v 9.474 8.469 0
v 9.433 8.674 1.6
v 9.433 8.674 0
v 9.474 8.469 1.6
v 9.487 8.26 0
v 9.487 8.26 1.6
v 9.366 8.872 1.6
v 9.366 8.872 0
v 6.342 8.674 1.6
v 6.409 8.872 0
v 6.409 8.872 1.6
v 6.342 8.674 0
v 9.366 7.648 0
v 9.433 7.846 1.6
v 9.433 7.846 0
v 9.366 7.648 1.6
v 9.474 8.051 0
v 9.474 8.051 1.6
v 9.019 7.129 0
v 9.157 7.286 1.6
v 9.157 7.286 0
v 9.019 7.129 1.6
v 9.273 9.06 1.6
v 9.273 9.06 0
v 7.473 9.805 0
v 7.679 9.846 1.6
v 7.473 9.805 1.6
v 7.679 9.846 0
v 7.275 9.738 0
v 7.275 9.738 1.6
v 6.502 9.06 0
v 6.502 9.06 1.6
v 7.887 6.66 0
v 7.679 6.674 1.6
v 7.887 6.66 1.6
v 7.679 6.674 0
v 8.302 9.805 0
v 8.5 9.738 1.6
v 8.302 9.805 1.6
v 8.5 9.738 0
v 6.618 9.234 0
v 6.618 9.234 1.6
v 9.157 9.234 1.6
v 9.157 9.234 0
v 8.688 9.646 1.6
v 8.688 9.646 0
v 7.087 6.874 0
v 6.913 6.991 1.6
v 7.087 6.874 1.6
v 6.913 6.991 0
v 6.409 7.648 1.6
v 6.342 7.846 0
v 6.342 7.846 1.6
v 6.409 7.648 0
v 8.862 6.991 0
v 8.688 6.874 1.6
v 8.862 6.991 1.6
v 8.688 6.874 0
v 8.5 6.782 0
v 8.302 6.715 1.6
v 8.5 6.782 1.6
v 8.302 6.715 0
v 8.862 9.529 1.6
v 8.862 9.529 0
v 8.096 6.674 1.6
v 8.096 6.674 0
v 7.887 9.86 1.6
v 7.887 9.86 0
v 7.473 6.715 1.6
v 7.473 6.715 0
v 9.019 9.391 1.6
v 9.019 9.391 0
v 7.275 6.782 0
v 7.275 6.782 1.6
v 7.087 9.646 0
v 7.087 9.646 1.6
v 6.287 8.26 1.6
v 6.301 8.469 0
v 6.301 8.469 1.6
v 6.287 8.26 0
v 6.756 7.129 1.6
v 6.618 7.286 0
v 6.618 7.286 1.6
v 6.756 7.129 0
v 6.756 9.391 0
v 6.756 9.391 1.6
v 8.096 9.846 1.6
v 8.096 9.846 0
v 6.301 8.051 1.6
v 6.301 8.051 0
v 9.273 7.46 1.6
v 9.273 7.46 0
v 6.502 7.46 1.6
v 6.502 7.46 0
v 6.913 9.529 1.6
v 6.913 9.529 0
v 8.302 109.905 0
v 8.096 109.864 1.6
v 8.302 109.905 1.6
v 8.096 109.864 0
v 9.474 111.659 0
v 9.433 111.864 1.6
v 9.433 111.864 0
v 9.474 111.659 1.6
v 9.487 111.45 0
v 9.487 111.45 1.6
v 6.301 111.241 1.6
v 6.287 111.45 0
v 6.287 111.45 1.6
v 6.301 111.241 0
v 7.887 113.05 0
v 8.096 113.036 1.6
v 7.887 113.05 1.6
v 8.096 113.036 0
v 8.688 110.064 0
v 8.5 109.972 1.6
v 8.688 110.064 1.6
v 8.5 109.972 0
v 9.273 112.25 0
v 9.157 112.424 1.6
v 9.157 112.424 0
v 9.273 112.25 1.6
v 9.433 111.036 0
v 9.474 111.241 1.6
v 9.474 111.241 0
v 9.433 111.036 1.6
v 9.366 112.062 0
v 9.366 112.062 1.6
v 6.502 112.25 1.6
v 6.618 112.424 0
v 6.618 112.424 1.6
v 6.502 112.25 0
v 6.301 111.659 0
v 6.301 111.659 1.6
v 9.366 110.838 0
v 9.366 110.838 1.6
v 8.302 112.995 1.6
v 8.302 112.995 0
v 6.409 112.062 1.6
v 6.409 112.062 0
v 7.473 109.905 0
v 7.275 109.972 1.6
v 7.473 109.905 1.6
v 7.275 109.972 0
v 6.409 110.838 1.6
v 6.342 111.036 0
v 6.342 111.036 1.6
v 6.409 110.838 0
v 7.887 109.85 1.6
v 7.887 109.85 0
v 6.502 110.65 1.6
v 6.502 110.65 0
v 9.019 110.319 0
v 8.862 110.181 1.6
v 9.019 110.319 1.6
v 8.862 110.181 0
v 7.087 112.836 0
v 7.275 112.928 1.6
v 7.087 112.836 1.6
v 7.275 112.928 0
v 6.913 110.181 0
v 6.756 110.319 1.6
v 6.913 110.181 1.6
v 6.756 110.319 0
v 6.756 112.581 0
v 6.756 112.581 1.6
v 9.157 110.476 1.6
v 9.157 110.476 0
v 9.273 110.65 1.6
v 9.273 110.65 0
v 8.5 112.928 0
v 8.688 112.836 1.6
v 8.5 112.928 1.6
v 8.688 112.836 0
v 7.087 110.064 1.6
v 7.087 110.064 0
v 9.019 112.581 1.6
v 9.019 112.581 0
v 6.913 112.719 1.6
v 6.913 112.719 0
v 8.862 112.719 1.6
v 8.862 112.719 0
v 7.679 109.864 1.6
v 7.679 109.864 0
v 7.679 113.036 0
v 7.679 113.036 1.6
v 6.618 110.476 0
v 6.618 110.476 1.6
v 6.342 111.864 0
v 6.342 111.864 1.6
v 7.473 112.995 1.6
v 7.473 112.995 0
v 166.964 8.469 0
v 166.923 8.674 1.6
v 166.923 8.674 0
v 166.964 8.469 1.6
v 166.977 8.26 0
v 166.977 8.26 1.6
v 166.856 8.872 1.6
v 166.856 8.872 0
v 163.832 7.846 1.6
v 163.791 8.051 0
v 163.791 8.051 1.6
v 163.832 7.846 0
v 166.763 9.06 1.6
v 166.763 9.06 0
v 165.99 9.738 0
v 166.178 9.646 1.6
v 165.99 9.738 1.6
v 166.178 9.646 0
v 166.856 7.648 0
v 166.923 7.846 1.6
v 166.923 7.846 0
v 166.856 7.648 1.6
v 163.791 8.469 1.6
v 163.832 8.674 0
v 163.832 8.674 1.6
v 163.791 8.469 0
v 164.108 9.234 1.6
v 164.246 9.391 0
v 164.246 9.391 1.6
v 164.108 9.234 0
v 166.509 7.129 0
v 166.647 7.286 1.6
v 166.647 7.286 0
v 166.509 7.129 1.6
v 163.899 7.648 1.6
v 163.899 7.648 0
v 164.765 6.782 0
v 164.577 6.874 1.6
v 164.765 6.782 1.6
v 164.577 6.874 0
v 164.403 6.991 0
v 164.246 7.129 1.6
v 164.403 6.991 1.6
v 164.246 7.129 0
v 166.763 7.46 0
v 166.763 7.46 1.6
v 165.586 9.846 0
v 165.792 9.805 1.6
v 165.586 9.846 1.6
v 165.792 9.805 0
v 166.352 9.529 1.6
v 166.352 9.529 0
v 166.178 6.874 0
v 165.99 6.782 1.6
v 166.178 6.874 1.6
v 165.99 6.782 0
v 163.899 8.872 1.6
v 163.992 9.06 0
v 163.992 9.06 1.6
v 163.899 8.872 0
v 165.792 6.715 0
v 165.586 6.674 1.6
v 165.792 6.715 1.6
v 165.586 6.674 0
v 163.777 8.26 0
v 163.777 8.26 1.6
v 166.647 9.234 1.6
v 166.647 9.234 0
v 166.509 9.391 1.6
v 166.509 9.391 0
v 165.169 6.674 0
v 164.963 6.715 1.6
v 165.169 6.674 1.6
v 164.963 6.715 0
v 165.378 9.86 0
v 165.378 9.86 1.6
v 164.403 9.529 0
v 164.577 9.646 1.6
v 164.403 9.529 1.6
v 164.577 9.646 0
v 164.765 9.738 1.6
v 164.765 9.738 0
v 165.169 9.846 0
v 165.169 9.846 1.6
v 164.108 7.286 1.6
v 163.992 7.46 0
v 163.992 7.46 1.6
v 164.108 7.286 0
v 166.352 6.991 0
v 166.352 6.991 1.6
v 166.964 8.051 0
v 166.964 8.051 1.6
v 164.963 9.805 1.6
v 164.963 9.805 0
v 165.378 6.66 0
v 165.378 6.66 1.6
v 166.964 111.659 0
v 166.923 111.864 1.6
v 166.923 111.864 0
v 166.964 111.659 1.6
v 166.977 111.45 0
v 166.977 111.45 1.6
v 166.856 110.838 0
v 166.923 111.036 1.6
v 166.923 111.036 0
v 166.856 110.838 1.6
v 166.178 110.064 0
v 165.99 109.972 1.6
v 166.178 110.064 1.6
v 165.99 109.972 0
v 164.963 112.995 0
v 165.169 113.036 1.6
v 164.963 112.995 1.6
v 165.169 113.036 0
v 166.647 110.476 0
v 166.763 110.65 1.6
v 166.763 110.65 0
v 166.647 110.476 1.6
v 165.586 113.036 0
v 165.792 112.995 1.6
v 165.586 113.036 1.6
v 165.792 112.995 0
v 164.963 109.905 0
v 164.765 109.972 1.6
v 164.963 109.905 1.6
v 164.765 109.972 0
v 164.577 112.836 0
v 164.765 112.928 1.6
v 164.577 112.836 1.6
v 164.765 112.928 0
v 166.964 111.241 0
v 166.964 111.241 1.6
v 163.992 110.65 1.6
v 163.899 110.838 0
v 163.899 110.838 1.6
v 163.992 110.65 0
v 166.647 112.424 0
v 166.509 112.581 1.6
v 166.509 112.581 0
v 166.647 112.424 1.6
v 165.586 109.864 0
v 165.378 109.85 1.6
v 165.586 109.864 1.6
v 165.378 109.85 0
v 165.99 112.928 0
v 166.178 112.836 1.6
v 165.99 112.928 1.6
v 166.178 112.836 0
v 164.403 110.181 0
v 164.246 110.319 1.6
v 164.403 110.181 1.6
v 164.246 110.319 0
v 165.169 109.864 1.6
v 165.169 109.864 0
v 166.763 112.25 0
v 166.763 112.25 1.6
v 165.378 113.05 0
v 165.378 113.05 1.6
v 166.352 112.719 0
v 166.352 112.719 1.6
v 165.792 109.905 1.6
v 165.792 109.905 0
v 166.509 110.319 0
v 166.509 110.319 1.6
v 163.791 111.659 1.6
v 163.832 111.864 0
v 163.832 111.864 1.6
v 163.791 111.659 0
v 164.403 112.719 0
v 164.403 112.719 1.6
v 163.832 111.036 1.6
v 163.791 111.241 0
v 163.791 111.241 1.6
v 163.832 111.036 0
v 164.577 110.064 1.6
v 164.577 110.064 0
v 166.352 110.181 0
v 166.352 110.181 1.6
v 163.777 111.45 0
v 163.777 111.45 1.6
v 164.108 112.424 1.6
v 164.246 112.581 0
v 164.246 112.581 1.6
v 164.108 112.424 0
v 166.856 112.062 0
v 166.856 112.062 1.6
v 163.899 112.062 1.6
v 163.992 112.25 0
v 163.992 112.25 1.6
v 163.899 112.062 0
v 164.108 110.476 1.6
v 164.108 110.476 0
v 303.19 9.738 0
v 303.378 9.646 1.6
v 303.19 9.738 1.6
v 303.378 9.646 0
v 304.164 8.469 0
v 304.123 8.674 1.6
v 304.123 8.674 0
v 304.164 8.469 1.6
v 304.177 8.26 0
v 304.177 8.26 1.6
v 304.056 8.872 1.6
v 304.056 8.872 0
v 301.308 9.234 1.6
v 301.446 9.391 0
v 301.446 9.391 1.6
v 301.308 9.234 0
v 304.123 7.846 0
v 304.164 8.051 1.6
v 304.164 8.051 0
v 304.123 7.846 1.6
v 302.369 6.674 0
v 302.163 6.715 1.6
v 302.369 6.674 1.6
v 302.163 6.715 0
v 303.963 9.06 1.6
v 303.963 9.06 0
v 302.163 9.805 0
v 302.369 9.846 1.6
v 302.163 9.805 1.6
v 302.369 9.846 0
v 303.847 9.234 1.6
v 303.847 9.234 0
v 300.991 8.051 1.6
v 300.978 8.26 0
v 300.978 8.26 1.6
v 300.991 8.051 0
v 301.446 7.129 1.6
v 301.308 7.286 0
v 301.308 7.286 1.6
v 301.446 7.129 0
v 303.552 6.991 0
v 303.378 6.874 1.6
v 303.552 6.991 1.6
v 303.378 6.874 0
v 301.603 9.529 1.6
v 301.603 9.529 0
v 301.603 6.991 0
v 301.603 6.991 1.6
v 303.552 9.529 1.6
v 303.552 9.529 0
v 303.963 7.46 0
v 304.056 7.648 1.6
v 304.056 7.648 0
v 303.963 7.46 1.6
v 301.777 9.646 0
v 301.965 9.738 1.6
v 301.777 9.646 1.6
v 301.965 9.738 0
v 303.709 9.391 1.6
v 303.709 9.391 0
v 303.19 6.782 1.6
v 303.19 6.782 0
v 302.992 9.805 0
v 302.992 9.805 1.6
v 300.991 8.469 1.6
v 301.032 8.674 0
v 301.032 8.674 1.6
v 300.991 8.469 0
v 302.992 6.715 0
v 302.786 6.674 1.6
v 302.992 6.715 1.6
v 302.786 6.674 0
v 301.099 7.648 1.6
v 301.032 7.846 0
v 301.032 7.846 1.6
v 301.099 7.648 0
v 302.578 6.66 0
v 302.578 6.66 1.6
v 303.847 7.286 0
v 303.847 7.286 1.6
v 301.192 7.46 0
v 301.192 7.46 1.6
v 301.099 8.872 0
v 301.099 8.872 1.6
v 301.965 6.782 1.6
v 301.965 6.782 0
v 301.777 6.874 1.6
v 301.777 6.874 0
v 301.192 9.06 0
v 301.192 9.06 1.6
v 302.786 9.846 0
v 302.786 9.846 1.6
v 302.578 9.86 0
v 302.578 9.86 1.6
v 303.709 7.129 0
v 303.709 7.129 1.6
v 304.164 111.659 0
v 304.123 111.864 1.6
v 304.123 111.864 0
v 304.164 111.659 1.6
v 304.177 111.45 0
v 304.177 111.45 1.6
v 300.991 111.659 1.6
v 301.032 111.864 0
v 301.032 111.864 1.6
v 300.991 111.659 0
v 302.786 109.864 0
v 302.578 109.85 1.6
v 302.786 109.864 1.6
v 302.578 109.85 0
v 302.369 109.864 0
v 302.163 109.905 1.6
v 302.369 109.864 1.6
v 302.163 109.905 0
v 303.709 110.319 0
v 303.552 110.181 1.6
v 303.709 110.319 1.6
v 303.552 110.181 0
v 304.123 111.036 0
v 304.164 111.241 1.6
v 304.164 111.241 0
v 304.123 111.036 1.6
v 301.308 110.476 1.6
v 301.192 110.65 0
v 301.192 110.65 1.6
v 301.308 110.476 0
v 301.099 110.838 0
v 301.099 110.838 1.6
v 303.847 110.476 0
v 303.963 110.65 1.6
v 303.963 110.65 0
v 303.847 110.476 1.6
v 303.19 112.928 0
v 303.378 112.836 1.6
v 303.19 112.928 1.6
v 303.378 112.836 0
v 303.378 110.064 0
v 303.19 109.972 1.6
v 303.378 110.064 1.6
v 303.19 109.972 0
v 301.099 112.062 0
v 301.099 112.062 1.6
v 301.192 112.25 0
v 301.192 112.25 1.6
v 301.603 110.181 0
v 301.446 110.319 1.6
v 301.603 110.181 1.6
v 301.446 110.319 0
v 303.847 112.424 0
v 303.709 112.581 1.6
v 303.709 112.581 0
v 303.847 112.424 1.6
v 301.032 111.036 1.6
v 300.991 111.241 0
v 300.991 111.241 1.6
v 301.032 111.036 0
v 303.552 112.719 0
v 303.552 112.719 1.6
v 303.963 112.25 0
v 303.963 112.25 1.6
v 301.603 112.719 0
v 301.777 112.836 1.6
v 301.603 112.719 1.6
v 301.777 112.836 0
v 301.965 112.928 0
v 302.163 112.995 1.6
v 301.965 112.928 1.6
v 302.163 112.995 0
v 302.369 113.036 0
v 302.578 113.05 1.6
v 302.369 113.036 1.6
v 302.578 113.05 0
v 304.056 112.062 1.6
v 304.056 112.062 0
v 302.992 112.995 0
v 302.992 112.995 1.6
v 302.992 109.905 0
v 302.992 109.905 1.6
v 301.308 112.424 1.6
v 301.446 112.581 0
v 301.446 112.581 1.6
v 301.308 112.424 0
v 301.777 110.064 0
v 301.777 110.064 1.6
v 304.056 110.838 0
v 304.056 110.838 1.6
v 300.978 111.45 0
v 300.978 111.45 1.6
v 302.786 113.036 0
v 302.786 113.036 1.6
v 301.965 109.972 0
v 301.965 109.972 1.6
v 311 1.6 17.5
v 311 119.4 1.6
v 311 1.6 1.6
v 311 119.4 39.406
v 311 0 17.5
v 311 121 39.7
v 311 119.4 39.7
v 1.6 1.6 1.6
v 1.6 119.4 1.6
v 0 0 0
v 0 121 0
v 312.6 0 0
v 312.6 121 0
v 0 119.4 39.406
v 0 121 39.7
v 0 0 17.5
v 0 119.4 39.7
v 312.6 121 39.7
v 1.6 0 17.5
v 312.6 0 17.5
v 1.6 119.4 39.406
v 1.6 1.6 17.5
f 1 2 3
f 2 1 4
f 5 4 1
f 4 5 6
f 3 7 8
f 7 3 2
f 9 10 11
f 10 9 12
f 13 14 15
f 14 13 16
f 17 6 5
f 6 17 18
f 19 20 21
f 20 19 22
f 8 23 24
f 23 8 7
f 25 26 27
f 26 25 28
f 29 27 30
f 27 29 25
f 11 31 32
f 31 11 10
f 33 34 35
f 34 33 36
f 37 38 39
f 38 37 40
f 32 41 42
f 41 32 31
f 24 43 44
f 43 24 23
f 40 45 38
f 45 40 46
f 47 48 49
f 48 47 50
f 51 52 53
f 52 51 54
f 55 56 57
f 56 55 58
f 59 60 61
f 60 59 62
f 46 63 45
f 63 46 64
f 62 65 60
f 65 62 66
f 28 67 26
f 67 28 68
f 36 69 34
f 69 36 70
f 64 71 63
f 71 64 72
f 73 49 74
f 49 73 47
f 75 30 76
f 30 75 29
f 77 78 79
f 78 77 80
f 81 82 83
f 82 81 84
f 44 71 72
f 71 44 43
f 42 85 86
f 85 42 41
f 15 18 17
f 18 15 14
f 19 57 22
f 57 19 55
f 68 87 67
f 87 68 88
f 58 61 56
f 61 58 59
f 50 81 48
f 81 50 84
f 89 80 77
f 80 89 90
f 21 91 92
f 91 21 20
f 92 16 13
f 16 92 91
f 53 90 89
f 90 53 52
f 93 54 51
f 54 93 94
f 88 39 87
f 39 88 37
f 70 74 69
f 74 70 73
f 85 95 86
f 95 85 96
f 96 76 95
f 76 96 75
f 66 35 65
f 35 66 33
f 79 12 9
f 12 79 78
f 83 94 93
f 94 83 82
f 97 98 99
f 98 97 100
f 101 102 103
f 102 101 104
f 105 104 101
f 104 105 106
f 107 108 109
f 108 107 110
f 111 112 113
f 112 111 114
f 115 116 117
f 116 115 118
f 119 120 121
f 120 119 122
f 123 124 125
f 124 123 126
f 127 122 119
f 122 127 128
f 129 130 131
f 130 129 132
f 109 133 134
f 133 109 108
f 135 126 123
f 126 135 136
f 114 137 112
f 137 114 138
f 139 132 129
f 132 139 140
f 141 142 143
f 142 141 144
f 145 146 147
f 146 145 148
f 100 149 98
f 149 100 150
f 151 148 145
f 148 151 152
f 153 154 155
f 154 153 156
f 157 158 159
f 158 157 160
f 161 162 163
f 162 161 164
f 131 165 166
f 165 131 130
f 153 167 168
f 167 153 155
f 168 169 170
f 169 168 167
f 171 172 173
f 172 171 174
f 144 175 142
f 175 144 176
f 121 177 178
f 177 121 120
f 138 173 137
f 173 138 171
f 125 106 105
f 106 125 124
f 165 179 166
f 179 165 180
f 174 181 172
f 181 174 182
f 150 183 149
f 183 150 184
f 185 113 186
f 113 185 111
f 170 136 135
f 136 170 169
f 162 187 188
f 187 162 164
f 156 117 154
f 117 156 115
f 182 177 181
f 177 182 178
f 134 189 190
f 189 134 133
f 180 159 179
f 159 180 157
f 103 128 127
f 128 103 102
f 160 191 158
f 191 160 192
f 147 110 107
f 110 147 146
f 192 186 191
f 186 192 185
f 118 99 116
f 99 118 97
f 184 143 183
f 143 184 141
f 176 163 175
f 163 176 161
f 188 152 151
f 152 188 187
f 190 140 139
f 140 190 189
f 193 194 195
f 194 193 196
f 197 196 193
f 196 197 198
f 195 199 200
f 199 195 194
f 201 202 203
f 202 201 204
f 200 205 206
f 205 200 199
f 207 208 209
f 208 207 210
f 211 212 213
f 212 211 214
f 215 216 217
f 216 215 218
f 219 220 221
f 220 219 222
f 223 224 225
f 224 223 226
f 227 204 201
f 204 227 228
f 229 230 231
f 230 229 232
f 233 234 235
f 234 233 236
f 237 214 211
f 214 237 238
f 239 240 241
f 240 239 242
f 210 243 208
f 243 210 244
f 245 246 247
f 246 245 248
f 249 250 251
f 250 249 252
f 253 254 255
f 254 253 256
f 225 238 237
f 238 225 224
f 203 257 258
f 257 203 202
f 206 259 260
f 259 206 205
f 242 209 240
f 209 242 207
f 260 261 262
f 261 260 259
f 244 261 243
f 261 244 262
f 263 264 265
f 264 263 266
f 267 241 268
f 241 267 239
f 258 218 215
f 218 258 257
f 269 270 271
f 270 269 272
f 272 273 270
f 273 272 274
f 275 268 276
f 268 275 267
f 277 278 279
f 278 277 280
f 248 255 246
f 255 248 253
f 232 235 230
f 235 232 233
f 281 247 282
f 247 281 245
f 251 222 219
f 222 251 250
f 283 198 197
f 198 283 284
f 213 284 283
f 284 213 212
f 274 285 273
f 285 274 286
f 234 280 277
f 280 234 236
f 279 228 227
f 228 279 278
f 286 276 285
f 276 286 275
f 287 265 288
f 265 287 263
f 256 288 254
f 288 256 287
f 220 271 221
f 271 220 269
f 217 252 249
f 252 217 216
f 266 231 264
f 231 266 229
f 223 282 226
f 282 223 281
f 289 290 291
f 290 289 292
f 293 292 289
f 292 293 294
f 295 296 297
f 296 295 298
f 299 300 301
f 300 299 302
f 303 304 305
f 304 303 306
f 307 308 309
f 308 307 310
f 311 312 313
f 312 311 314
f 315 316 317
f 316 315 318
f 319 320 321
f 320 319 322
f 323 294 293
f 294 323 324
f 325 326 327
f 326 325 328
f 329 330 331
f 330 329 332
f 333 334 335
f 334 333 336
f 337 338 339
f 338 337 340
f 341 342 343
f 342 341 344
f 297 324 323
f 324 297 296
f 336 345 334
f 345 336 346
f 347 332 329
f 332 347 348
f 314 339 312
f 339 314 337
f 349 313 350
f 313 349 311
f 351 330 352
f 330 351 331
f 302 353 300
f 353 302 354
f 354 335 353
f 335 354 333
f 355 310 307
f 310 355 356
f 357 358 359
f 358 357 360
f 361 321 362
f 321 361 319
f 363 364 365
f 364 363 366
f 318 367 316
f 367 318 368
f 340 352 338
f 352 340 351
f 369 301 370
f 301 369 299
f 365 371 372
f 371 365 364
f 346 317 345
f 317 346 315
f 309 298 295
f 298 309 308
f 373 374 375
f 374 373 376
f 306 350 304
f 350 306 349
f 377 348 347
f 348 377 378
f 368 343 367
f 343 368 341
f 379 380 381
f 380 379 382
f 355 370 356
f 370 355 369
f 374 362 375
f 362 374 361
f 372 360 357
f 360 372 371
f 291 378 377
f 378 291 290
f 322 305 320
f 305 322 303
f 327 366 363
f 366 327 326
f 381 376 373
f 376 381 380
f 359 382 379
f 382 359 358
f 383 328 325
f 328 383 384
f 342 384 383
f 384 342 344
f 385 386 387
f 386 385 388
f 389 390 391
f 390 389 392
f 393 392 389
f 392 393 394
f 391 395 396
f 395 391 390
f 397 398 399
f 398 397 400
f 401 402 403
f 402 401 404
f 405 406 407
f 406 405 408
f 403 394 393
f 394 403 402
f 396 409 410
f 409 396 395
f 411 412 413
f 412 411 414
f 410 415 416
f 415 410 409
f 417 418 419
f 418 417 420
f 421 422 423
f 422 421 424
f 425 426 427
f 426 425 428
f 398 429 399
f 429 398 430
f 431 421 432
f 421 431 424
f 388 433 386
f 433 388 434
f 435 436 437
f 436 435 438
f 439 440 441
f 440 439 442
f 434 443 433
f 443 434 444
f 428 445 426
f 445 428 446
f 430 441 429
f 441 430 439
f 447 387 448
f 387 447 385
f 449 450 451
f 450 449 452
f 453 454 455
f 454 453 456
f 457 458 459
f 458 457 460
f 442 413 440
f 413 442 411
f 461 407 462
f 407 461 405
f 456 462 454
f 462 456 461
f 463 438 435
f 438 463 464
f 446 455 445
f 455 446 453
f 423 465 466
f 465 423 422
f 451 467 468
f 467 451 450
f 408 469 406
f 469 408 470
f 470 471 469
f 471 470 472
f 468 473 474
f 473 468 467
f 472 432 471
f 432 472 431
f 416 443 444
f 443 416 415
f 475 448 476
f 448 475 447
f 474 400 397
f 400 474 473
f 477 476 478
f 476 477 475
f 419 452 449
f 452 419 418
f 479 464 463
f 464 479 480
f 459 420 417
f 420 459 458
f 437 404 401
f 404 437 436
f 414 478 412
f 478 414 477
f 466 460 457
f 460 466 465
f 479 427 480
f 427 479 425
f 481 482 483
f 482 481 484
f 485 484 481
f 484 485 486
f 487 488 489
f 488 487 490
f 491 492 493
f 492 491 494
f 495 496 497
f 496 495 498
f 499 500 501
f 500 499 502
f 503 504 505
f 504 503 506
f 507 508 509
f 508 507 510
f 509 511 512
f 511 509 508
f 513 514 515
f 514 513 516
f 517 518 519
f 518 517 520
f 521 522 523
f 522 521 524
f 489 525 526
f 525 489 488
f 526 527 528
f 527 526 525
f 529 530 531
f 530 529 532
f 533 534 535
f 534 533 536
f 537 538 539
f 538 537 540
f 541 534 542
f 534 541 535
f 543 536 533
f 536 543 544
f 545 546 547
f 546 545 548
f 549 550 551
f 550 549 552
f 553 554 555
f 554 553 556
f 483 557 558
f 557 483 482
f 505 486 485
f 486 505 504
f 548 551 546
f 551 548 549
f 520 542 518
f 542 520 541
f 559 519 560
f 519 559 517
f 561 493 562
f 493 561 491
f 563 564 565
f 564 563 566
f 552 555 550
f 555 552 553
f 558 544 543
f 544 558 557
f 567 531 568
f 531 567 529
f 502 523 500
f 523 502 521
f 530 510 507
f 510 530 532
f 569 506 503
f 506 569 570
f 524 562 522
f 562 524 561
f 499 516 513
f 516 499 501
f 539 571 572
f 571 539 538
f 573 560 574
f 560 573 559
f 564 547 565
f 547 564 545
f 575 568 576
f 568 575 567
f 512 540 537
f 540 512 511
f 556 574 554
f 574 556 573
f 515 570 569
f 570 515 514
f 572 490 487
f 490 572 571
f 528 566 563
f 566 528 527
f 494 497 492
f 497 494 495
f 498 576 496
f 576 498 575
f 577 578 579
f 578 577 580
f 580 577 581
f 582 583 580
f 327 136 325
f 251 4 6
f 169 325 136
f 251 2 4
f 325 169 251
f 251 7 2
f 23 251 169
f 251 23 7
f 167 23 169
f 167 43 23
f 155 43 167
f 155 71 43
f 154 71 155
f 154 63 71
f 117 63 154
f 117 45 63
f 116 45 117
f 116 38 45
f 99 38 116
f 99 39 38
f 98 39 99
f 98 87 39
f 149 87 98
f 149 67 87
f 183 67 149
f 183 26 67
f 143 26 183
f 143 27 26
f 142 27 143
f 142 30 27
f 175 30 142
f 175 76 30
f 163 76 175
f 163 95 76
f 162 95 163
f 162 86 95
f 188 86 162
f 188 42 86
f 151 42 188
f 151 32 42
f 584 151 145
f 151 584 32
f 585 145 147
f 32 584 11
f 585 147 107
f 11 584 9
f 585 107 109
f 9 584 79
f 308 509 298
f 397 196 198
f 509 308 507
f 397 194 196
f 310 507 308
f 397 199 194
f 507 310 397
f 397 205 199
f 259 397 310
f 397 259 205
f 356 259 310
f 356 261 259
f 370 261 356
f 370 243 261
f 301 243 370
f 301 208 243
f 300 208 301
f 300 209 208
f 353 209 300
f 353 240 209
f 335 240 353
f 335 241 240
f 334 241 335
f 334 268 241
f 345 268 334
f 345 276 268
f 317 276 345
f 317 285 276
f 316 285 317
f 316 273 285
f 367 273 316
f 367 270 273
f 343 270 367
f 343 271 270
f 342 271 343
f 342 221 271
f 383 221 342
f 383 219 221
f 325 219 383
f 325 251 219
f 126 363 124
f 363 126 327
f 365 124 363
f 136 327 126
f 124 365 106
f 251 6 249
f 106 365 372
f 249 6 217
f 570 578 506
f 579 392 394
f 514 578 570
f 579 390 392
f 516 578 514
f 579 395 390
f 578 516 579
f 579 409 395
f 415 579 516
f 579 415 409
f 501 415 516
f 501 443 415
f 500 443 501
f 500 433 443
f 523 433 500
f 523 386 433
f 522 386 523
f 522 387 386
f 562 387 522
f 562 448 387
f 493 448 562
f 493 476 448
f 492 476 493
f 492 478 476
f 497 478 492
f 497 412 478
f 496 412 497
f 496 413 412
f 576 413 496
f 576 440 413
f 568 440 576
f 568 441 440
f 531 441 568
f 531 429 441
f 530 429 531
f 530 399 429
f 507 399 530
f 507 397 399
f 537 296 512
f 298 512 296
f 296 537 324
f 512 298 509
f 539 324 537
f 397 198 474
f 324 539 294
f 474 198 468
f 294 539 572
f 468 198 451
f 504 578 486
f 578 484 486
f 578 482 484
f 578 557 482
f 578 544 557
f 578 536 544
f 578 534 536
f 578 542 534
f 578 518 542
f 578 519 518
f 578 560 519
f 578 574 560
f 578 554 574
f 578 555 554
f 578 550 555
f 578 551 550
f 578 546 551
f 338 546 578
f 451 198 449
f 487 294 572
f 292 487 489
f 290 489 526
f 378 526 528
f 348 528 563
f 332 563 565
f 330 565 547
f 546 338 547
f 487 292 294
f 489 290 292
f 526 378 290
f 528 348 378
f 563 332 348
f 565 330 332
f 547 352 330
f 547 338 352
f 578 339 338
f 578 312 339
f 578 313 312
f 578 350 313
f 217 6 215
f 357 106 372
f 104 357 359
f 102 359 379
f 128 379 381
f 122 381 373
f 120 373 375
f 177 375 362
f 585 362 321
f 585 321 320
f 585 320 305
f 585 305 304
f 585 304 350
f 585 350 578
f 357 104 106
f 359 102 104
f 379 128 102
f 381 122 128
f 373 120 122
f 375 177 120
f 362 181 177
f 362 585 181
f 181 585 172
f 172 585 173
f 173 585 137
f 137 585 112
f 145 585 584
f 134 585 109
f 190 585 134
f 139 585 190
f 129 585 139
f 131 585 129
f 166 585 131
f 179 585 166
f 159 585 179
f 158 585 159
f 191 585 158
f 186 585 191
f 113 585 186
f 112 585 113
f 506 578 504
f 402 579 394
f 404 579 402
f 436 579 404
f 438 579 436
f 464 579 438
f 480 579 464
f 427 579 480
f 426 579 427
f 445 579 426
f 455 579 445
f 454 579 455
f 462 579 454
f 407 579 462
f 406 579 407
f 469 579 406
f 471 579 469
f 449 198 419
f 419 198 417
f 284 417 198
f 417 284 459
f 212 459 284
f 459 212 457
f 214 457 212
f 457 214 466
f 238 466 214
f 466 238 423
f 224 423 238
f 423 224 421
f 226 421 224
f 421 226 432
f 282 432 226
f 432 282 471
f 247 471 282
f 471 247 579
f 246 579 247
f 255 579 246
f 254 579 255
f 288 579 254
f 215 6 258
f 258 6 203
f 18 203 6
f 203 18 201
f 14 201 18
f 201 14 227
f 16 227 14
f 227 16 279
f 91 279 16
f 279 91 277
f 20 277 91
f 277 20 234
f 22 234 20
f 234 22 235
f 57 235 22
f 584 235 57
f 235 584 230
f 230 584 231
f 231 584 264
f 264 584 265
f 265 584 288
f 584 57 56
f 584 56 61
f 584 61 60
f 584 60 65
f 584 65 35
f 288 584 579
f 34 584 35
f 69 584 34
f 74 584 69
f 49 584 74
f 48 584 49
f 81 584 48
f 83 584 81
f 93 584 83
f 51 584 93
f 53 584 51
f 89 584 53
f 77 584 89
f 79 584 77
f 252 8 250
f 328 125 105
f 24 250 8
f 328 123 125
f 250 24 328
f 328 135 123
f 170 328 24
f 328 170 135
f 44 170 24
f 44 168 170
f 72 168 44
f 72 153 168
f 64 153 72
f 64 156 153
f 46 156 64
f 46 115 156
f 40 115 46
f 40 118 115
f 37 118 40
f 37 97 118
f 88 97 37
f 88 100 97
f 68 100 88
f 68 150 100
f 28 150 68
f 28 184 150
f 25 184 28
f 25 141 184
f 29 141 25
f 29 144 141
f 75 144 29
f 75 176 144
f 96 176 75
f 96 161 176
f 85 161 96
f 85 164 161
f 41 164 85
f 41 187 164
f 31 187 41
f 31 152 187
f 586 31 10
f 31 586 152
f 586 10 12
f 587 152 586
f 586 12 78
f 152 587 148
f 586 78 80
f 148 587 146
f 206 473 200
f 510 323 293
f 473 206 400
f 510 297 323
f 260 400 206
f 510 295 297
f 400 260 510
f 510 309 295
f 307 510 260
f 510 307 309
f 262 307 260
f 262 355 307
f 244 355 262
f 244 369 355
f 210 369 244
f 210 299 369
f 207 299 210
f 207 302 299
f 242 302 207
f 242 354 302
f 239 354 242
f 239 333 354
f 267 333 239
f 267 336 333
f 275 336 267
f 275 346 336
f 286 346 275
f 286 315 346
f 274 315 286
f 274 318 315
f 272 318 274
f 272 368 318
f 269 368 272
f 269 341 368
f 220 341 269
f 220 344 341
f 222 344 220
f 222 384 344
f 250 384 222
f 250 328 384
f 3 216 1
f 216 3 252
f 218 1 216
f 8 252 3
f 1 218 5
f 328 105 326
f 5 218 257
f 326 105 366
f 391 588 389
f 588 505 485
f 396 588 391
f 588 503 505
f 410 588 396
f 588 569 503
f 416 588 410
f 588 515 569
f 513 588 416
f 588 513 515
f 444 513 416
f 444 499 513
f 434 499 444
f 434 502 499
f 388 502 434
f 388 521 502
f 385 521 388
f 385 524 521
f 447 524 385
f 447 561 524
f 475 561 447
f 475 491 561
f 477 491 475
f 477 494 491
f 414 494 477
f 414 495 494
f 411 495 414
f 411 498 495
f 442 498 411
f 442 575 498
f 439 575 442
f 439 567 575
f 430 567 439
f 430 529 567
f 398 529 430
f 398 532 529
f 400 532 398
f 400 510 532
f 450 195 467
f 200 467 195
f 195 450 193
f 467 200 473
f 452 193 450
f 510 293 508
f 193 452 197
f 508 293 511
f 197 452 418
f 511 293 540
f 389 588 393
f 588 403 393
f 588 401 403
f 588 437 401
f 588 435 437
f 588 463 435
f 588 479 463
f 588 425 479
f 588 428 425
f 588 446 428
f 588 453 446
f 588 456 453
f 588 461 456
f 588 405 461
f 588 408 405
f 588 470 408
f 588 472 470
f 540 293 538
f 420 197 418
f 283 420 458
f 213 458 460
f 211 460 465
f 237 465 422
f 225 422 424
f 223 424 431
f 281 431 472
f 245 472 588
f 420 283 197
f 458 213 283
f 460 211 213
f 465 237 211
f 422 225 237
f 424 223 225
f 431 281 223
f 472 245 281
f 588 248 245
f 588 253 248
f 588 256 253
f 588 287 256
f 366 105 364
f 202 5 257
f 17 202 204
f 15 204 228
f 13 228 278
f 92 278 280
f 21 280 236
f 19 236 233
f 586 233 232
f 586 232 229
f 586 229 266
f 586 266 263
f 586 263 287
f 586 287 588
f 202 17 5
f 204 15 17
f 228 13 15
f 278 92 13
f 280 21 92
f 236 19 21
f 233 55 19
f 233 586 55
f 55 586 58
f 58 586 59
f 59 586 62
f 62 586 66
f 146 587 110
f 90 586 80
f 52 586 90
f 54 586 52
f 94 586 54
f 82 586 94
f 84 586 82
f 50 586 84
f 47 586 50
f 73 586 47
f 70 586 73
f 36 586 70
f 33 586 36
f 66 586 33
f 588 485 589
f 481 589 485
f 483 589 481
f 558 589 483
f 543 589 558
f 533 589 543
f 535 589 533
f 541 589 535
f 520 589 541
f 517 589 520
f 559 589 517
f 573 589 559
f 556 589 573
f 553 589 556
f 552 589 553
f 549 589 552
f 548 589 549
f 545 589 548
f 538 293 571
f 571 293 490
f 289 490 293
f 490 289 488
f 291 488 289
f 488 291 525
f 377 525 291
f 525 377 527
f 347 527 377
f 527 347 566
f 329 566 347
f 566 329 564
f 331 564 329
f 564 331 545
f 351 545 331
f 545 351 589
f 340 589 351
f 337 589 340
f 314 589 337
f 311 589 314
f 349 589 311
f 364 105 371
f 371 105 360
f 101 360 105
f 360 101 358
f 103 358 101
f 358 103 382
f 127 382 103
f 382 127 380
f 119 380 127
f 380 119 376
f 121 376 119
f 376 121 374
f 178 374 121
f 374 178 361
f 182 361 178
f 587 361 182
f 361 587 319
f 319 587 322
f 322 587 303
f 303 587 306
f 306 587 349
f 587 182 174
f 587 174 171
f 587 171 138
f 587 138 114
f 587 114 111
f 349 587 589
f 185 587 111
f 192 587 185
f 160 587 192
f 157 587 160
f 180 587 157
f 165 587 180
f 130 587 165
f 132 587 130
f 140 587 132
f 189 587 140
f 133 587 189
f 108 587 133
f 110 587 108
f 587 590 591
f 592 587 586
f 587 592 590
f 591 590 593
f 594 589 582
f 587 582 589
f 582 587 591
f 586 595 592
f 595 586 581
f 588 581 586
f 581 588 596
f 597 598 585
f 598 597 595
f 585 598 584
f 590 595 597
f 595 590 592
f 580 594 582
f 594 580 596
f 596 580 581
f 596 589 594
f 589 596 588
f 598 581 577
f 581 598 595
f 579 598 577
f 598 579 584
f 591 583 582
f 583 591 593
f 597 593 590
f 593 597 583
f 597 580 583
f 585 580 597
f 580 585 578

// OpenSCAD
//
// simple case for minimial-60 keyboaard
//

pcb_wid = 302.26;
pcb_hgt = 109.22;

case_wid = 311;
case_hgt = 121;
case_front = 15.9;     // 5/8
case_rear =  38.1;      // 1.5
x_hole = [ 3.81, 161.3, 298.5];
// y_hole = [ 3.81, 105.4];   in plane of PCB
y_hole = [ 3.81, 107.0 ];  // on bottom

x_marg = (case_wid - (x_hole[2]-x_hole[0]))/4;
y_marg = (case_hgt - 103.2)/4;

// bit of trig
opp = case_rear - case_front;
adj = case_hgt;
slope = sqrt( opp*opp+adj*adj);
angle = atan( opp/adj);

hole_dia = 3.2;

e = 0.1;
thick = 1.6;

$fn=48;

module hole_at( x, y, dia) {
     translate( [x, y, -e])
	  cylinder( h=30, d=dia);
}

//
// sloping panel, not part of the main print
//
module sloping() {
     translate( [0, 0, case_front])
	  rotate( [angle, 0, 0])
	  linear_extrude( height=thick) {
	  polygon( points = [[ 0,0], [case_wid, 0], [case_wid, slope],
			     [ 0, slope], [0,0]]);
     };
}

module end() {
     linear_extrude( height=thick) {
	  polygon( points = [ [0,0], [case_hgt, 0], [case_hgt, case_rear+thick],
			      [0, case_front+thick], [0, 0]]);
	  }
}

module case() {
     difference() {
	  cube( [case_wid, case_hgt, thick]);
	  for( x=x_hole) {
	       for( y=y_hole) {
		    hole_at( x+x_marg, y+y_marg, hole_dia);
	       }
	  }
     }
     cube( [case_wid, thick, case_front+thick]);
     translate( [0, case_hgt-thick, 0])
	  cube( [case_wid, thick, case_rear+thick]);

     rotate( [90, 0, 90]) {
	  end();
	  translate( [0, 0, case_wid])
	       end();
     }
}

case();
